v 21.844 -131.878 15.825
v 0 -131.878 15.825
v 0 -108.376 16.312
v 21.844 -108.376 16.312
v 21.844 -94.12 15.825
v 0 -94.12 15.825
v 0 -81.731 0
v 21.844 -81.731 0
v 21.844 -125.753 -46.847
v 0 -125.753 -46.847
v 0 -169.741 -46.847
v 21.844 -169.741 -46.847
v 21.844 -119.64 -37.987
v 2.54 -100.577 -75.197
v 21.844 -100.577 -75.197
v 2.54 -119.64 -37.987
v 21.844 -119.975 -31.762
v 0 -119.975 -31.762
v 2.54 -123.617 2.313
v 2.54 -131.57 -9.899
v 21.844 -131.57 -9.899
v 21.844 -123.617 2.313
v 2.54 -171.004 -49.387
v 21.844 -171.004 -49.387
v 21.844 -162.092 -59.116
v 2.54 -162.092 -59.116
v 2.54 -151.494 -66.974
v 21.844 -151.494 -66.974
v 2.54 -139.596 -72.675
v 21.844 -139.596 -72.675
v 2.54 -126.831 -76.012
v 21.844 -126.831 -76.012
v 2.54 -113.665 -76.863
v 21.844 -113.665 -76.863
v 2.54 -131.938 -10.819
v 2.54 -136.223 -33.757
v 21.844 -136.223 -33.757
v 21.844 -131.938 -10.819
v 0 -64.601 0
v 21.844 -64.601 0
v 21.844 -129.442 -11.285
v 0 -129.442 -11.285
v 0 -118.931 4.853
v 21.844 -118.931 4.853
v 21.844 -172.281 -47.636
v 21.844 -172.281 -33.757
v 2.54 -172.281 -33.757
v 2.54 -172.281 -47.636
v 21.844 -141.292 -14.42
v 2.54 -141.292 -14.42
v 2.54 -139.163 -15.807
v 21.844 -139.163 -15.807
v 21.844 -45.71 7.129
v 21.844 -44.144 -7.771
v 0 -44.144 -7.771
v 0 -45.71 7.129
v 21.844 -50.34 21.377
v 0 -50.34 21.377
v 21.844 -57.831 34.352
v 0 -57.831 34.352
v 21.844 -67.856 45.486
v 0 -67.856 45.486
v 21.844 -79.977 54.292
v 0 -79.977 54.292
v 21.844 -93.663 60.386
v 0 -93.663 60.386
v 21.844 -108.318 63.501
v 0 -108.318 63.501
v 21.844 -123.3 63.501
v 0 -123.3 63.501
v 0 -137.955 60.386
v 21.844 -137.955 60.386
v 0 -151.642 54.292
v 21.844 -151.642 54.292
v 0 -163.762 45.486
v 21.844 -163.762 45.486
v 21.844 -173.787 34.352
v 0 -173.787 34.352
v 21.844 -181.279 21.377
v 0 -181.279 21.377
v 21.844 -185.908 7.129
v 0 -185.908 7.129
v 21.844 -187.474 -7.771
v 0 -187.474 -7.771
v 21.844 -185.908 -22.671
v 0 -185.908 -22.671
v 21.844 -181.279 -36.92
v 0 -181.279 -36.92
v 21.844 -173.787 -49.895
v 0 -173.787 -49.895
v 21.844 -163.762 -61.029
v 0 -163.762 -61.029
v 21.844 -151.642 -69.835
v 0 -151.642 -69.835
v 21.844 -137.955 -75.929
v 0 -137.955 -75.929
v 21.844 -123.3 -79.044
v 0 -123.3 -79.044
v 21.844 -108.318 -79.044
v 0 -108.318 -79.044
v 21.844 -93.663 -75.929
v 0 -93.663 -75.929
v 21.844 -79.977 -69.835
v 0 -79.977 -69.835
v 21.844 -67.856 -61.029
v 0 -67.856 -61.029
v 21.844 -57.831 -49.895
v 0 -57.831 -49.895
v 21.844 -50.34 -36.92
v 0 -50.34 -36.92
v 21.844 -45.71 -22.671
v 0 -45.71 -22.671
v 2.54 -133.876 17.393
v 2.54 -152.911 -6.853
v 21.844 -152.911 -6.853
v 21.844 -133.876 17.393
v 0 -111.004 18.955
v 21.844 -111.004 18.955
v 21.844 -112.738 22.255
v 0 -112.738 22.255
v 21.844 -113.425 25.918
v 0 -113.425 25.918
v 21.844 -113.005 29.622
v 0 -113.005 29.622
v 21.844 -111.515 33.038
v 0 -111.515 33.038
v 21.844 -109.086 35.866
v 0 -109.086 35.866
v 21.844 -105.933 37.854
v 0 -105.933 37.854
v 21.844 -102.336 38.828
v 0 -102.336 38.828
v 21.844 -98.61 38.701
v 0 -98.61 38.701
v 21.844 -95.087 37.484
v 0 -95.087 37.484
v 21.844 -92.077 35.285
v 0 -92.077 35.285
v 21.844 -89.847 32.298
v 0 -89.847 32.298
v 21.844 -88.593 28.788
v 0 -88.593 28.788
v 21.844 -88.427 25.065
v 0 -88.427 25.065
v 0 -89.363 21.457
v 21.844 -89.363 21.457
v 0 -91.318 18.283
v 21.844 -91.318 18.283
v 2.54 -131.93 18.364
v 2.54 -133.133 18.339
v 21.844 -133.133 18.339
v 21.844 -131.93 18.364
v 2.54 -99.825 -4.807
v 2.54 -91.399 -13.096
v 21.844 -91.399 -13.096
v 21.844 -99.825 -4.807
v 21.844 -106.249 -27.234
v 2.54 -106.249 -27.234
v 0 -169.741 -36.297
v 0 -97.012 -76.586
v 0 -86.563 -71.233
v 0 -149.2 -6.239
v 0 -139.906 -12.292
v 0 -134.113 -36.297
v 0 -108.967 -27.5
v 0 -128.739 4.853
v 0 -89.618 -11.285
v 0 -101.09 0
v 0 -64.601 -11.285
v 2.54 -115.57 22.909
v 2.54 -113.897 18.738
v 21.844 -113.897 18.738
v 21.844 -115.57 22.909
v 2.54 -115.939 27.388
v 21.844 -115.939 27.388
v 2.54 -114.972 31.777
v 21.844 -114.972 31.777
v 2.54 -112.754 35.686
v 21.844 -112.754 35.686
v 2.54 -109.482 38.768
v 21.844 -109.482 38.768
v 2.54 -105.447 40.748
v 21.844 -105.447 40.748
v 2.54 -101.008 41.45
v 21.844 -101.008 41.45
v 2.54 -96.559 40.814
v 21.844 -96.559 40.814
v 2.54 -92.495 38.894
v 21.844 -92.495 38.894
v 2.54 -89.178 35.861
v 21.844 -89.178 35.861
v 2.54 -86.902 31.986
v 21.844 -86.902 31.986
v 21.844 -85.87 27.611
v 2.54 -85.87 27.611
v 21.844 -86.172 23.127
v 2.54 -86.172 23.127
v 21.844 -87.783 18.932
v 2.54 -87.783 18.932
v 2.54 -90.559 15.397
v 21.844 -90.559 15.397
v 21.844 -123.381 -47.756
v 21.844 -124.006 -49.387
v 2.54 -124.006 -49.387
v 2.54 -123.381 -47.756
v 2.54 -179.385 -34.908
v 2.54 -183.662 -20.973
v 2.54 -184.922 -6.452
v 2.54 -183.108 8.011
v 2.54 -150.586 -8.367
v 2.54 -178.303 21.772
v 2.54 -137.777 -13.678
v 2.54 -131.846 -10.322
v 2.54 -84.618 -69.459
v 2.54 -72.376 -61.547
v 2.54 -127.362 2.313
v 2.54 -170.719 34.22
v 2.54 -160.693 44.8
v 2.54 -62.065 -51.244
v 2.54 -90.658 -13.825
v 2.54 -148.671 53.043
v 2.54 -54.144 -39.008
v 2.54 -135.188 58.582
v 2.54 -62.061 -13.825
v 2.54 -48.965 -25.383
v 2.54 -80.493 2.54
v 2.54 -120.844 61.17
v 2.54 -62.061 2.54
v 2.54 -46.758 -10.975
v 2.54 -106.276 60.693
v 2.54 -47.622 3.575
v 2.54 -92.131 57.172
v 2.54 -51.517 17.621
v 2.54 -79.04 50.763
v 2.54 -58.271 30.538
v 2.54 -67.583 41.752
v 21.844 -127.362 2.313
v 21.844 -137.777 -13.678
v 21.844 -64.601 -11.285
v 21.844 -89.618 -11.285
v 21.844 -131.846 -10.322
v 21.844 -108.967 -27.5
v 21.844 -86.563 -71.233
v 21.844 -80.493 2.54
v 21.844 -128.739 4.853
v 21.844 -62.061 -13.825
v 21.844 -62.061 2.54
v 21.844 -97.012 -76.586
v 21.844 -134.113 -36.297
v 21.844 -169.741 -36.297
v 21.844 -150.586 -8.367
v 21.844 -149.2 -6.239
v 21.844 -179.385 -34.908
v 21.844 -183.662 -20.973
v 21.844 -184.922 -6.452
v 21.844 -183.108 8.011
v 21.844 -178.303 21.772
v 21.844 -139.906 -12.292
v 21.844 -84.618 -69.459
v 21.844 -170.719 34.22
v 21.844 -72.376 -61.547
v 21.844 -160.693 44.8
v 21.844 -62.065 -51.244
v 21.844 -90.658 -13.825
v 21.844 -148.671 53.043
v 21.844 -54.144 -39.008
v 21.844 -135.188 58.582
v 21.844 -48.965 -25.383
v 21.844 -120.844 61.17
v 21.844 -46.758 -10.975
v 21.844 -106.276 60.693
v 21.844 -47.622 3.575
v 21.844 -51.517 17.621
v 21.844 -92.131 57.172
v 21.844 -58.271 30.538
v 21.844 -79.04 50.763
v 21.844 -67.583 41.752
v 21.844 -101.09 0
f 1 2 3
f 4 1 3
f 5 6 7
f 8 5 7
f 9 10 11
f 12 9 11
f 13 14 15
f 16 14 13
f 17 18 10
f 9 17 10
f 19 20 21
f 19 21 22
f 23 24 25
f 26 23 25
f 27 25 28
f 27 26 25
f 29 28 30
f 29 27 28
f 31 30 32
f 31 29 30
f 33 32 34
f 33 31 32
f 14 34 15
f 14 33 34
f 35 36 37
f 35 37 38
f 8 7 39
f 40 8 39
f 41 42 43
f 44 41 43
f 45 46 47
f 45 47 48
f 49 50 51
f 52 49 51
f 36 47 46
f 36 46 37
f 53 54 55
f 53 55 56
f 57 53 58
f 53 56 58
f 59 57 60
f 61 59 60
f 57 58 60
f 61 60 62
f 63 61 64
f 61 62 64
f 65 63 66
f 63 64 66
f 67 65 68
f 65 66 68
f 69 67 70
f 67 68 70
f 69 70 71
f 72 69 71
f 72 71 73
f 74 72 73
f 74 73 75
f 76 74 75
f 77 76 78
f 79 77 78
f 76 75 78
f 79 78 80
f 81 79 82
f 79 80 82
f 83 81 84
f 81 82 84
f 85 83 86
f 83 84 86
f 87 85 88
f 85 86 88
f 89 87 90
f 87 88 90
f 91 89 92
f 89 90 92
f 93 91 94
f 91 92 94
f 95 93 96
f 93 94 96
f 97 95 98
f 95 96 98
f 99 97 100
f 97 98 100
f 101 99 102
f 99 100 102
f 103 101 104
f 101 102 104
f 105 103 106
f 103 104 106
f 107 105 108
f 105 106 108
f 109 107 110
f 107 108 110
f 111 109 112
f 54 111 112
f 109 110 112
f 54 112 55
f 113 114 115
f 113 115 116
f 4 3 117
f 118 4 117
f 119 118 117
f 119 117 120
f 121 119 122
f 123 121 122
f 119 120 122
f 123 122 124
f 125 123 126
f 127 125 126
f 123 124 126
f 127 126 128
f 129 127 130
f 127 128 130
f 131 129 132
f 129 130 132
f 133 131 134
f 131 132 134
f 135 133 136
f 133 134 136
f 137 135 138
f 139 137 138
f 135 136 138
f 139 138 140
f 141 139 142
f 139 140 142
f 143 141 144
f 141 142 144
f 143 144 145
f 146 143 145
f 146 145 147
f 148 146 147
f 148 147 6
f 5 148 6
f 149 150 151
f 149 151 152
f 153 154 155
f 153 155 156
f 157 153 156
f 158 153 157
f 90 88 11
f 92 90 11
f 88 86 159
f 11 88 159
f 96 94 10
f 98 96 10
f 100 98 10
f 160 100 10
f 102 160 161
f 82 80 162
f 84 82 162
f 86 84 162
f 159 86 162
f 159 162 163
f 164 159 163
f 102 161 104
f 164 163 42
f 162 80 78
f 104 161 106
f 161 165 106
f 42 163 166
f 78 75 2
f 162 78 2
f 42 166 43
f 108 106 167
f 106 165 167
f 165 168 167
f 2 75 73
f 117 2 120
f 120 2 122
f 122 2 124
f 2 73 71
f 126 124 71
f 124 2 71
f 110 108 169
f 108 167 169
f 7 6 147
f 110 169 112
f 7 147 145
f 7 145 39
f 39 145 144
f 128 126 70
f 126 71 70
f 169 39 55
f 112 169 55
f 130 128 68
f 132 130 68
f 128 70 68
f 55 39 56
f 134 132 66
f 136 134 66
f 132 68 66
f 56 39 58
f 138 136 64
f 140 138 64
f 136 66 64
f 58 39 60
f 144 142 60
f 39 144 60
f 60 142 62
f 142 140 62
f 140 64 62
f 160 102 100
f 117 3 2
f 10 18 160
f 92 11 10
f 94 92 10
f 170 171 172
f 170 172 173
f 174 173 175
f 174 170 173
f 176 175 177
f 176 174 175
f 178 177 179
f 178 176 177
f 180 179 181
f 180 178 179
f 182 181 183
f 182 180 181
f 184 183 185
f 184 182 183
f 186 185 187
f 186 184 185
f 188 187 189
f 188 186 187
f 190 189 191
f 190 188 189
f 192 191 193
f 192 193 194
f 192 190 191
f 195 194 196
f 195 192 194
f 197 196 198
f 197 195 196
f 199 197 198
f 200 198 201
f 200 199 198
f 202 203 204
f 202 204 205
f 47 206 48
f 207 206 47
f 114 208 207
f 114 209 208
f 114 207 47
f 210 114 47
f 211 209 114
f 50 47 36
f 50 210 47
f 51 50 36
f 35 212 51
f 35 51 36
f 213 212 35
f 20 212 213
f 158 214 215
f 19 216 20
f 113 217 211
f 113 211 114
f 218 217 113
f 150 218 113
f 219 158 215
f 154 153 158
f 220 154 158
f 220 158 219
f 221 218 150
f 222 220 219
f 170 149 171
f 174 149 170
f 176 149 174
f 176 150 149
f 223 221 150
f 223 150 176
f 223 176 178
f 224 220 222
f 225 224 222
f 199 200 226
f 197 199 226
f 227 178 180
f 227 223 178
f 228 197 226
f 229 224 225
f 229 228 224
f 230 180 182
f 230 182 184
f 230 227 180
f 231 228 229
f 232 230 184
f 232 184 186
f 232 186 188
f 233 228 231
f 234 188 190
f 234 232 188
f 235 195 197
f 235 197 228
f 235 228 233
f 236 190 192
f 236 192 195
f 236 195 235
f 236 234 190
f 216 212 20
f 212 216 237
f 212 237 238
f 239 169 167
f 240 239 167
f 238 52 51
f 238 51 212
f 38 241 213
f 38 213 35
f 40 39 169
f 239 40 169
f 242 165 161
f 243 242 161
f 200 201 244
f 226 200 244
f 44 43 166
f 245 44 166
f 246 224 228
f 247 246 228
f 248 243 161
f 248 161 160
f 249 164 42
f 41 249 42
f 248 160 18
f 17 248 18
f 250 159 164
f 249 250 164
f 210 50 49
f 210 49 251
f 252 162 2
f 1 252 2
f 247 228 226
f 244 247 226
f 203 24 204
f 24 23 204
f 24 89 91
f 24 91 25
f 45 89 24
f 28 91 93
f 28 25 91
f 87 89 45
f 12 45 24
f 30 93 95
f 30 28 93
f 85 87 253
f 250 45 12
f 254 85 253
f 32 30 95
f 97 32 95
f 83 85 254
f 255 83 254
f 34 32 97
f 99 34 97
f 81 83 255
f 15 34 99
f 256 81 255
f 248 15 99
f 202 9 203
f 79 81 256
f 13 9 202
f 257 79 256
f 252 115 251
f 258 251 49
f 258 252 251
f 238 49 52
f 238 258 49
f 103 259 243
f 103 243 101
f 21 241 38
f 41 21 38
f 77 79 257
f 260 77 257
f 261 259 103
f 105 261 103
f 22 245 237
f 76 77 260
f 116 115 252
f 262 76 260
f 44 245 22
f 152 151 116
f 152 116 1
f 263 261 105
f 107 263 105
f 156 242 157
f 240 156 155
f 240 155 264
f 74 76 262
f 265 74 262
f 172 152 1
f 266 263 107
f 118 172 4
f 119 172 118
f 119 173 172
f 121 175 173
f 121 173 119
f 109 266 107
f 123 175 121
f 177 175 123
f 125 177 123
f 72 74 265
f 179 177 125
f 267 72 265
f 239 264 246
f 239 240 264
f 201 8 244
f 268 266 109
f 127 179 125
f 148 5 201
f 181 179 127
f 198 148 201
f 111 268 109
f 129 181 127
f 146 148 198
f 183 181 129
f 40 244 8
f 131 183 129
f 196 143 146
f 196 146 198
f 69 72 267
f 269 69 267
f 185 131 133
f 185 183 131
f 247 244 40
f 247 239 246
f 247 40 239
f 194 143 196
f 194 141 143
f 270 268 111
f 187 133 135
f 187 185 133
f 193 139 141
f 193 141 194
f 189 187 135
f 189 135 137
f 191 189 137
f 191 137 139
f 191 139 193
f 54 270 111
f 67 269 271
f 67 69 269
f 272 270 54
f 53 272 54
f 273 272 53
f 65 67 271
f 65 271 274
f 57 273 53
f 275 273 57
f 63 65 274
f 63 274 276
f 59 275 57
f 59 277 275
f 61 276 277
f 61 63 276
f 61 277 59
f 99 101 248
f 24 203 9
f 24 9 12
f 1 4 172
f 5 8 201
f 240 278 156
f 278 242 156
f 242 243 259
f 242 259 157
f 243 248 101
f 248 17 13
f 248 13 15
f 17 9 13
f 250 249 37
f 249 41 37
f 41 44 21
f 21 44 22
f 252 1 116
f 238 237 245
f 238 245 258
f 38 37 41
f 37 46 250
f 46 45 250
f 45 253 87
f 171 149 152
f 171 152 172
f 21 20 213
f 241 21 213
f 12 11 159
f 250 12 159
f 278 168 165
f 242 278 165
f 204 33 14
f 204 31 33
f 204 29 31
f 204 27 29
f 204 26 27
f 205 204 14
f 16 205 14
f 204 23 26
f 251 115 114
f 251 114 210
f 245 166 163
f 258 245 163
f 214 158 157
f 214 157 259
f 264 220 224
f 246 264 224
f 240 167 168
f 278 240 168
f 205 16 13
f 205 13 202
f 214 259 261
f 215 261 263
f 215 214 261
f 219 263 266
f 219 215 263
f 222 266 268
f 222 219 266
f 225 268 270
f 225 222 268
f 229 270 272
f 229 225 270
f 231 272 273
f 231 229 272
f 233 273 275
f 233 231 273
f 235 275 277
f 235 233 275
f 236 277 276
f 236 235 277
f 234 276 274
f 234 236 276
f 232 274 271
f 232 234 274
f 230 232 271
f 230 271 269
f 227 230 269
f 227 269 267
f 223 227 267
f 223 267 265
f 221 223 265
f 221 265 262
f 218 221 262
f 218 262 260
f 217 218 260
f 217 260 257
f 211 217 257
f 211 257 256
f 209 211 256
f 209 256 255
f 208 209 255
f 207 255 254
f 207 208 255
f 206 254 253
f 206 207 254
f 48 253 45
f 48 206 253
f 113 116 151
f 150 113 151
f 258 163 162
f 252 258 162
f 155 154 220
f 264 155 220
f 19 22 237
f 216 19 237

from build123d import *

# Parameters (mm, degrees)
F0_R        = 71.6651662247
F1_DEPTH    = 21.844
F2_T        = 2.54
F2_T3_DEPTH = 26.924


# Not quite as in the source:
# - a shell that OpenCascade refuses in one call is made with other operations: the cavity is built on its own and cut out
# - a feature names something its author has since deleted; it is built from what else it names


with BuildPart() as f1:
    # F0 (on Right) → F1 (new body)
    with BuildSketch(Plane.YZ):
        with Locations((-115.809135139, -7.7714063227)):
            Circle(F0_R)
        with BuildLine():
            ThreePointArc((-108.3759665489, 16.3117386401), (-100.4681563218, 38.9034837812), (-94.1200479865, 15.824880451))
            Line((-94.1200479865, 15.824880451), (-81.7305743694, 0))
            Line((-81.7305743694, 0), (-64.600661397, 0))
            Line((-64.600661397, 0), (-64.600661397, -11.2849194556))
            Line((-64.600661397, -11.2849194556), (-89.6177664399, -11.2849194556))
            Line((-89.6177664399, -11.2849194556), (-101.0896414518, 0))
            Line((-101.0896414518, 0), (-108.967371285, -27.4995788932))
            Line((-108.967371285, -27.4995788932), (-86.5627974272, -71.233086288))
            Line((-86.5627974272, -71.233086288), (-97.011906829, -76.5861406686))
            Line((-97.011906829, -76.5861406686), (-119.9753677787, -31.7616911776))
            Line((-119.9753677787, -31.7616911776), (-125.7533729076, -46.8470752239))
            Line((-125.7533729076, -46.8470752239), (-152.9145538807, -46.8470752239))
            Line((-152.9145538807, -46.8470752239), (-156.1464071274, -46.8470752239))
            Line((-156.1464071274, -46.8470752239), (-169.7414368391, -46.8470752239))
            Line((-169.7414368391, -46.8470752239), (-169.7414368391, -36.2966917455))
            Line((-169.7414368391, -36.2966917455), (-156.1464071274, -36.2966917455))
            Line((-156.1464071274, -36.2966917455), (-134.1130137444, -36.2966917455))
            Line((-134.1130137444, -36.2966917455), (-129.4415742159, -11.2849194556))
            Line((-129.4415742159, -11.2849194556), (-118.9312636852, 4.8525910825))
            Line((-118.9312636852, 4.8525910825), (-128.7393420935, 4.8525910825))
            Line((-128.7393420935, 4.8525910825), (-139.9055675141, -12.2920099139))
            Line((-139.9055675141, -12.2920099139), (-149.2000942902, -6.2385134702))
            Line((-149.2000942902, -6.2385134702), (-131.8777501583, 15.824880451))
            Line((-131.8777501583, 15.824880451), (-108.3759665489, 16.3117386401))
        make_face(mode=Mode.SUBTRACT)
    extrude(amount=F1_DEPTH)

    # F2: shell of thickness 2.54, made by hand


with BuildPart() as f2_core1:
    # F2_t2: copy of F1
    add(f1.part)

    # the walls: a layer under each face that stays
    f2_faces = [f2_core1.faces().sort_by_distance(p)[0] for p in [
        (10.922, -187.4743013637, -7.7714063227),
        (10.922, -140.5389222243, 4.7931834904),
        (10.922, -144.5528309022, -9.2652616921),
        (10.922, -134.3224548038, -3.7197094157),
        (10.922, -123.8353028893, 4.8525910825),
        (10.922, -124.1864189506, -3.2161641866),
        (10.922, -131.7772939801, -23.7908056006),
        (10.922, -151.9272252917, -36.2966917455),
        (10.922, -169.7414368391, -41.5718834847),
        (10.922, -147.7474048734, -46.8470752239),
        (10.922, -122.8643703432, -39.3043832007),
        (10.922, -108.4936373039, -54.1739159231),
        (10.922, -91.7873521281, -73.9096134783),
        (10.922, -97.7650843561, -49.3663325906),
        (10.922, -105.0285063684, -13.7497894466),
        (10.922, -95.3537039459, -5.6424597278),
        (10.922, -77.1092139184, -11.2849194556),
        (10.922, -64.600661397, -5.6424597278),
        (10.922, -73.1656178832, 0),
        (10.922, -87.925311178, 7.9124402255),
        (10.922, -100.4681563218, 38.9034837812),
        (10.922, -120.1268583536, 16.0683095455),
        (0, -163.5859126221, -55.5481838059),
    ]]
    thicken(f2_faces, amount=-F2_T, mode=Mode.SUBTRACT)

    # F2_s4 → F2_t3 (cut)
    with BuildSketch(Plane.YZ.offset(-2.54)):
        Polygon((-149.1662539052, -6.2329149117), (-151.197922499, -4.6699847175), (-152.9114712381, -6.8525242483), (-150.5863045792, -8.3668980771), align=None)
        Polygon((-131.8572458078, 15.7838006118), (-133.8755783671, 17.3934092037), (-133.1328452619, 18.3394251098), (-131.9303569971, 18.3643356131), align=None)
        Polygon((-139.9129892573, -12.256863965), (-141.2917778031, -14.4203945208), (-139.1633931962, -15.8066048098), (-137.7771829073, -13.6782202029), align=None)
        Polygon((-129.3953221194, -11.3034448695), (-131.5699588227, -9.8987091667), (-131.8456535688, -10.3220103485), (-131.9383992614, -10.8185883585), align=None)
        Polygon((-169.7160368391, -36.3220917455), (-169.7414368391, -33.7566917455), (-172.2814368391, -33.7566917455), (-172.2814368391, -36.2966917455), align=None)
        Polygon((-169.7160368391, -46.8216752239), (-172.2814368391, -46.8470752239), (-172.2814368391, -49.3870752239), (-169.7414368391, -49.3870752239), align=None)
        Polygon((-125.7770925414, -46.8125901277), (-125.7533729076, -49.3870752239), (-124.0063031182, -49.3870752239), (-123.3814095297, -47.7555848463), align=None)
        Polygon((-97.0008817516, -76.5519534244), (-99.2725229084, -77.7442490147), (-98.1144145624, -80.0048650942), (-95.8537984829, -78.8467567481), align=None)
        Polygon((-86.5969846714, -71.2220612106), (-85.4046890811, -73.4937023674), (-83.1440730016, -72.3355940214), (-84.3021813477, -70.0749779419), align=None)
        Polygon((-89.5999540811, -11.2414120021), (-91.3990023244, -13.095664806), (-90.6576662231, -13.8249194556), (-89.6177664399, -13.8249194556), align=None)
        Polygon((-64.626061397, -11.2595194556), (-64.600661397, -13.8249194556), (-62.060661397, -13.8249194556), (-62.060661397, -11.2849194556), align=None)
        Polygon((-64.626061397, -0.0254), (-62.060661397, 0), (-62.060661397, 2.54), (-64.600661397, 2.54), align=None)
    extrude(amount=F2_T3_DEPTH, mode=Mode.SUBTRACT)


with BuildPart() as f1_1:
    add(f1.part)

    # what is left inside the walls is the cavity
    f2_cavity = [f2_core1.part.solids().sort_by_distance(p)[0] for p in [
        (15.409333, -139.586841, -72.651283),
        (21.8186, -150.371718, 17.74945),
    ]]
    add(f2_cavity, mode=Mode.SUBTRACT)


solid = f1_1.part
